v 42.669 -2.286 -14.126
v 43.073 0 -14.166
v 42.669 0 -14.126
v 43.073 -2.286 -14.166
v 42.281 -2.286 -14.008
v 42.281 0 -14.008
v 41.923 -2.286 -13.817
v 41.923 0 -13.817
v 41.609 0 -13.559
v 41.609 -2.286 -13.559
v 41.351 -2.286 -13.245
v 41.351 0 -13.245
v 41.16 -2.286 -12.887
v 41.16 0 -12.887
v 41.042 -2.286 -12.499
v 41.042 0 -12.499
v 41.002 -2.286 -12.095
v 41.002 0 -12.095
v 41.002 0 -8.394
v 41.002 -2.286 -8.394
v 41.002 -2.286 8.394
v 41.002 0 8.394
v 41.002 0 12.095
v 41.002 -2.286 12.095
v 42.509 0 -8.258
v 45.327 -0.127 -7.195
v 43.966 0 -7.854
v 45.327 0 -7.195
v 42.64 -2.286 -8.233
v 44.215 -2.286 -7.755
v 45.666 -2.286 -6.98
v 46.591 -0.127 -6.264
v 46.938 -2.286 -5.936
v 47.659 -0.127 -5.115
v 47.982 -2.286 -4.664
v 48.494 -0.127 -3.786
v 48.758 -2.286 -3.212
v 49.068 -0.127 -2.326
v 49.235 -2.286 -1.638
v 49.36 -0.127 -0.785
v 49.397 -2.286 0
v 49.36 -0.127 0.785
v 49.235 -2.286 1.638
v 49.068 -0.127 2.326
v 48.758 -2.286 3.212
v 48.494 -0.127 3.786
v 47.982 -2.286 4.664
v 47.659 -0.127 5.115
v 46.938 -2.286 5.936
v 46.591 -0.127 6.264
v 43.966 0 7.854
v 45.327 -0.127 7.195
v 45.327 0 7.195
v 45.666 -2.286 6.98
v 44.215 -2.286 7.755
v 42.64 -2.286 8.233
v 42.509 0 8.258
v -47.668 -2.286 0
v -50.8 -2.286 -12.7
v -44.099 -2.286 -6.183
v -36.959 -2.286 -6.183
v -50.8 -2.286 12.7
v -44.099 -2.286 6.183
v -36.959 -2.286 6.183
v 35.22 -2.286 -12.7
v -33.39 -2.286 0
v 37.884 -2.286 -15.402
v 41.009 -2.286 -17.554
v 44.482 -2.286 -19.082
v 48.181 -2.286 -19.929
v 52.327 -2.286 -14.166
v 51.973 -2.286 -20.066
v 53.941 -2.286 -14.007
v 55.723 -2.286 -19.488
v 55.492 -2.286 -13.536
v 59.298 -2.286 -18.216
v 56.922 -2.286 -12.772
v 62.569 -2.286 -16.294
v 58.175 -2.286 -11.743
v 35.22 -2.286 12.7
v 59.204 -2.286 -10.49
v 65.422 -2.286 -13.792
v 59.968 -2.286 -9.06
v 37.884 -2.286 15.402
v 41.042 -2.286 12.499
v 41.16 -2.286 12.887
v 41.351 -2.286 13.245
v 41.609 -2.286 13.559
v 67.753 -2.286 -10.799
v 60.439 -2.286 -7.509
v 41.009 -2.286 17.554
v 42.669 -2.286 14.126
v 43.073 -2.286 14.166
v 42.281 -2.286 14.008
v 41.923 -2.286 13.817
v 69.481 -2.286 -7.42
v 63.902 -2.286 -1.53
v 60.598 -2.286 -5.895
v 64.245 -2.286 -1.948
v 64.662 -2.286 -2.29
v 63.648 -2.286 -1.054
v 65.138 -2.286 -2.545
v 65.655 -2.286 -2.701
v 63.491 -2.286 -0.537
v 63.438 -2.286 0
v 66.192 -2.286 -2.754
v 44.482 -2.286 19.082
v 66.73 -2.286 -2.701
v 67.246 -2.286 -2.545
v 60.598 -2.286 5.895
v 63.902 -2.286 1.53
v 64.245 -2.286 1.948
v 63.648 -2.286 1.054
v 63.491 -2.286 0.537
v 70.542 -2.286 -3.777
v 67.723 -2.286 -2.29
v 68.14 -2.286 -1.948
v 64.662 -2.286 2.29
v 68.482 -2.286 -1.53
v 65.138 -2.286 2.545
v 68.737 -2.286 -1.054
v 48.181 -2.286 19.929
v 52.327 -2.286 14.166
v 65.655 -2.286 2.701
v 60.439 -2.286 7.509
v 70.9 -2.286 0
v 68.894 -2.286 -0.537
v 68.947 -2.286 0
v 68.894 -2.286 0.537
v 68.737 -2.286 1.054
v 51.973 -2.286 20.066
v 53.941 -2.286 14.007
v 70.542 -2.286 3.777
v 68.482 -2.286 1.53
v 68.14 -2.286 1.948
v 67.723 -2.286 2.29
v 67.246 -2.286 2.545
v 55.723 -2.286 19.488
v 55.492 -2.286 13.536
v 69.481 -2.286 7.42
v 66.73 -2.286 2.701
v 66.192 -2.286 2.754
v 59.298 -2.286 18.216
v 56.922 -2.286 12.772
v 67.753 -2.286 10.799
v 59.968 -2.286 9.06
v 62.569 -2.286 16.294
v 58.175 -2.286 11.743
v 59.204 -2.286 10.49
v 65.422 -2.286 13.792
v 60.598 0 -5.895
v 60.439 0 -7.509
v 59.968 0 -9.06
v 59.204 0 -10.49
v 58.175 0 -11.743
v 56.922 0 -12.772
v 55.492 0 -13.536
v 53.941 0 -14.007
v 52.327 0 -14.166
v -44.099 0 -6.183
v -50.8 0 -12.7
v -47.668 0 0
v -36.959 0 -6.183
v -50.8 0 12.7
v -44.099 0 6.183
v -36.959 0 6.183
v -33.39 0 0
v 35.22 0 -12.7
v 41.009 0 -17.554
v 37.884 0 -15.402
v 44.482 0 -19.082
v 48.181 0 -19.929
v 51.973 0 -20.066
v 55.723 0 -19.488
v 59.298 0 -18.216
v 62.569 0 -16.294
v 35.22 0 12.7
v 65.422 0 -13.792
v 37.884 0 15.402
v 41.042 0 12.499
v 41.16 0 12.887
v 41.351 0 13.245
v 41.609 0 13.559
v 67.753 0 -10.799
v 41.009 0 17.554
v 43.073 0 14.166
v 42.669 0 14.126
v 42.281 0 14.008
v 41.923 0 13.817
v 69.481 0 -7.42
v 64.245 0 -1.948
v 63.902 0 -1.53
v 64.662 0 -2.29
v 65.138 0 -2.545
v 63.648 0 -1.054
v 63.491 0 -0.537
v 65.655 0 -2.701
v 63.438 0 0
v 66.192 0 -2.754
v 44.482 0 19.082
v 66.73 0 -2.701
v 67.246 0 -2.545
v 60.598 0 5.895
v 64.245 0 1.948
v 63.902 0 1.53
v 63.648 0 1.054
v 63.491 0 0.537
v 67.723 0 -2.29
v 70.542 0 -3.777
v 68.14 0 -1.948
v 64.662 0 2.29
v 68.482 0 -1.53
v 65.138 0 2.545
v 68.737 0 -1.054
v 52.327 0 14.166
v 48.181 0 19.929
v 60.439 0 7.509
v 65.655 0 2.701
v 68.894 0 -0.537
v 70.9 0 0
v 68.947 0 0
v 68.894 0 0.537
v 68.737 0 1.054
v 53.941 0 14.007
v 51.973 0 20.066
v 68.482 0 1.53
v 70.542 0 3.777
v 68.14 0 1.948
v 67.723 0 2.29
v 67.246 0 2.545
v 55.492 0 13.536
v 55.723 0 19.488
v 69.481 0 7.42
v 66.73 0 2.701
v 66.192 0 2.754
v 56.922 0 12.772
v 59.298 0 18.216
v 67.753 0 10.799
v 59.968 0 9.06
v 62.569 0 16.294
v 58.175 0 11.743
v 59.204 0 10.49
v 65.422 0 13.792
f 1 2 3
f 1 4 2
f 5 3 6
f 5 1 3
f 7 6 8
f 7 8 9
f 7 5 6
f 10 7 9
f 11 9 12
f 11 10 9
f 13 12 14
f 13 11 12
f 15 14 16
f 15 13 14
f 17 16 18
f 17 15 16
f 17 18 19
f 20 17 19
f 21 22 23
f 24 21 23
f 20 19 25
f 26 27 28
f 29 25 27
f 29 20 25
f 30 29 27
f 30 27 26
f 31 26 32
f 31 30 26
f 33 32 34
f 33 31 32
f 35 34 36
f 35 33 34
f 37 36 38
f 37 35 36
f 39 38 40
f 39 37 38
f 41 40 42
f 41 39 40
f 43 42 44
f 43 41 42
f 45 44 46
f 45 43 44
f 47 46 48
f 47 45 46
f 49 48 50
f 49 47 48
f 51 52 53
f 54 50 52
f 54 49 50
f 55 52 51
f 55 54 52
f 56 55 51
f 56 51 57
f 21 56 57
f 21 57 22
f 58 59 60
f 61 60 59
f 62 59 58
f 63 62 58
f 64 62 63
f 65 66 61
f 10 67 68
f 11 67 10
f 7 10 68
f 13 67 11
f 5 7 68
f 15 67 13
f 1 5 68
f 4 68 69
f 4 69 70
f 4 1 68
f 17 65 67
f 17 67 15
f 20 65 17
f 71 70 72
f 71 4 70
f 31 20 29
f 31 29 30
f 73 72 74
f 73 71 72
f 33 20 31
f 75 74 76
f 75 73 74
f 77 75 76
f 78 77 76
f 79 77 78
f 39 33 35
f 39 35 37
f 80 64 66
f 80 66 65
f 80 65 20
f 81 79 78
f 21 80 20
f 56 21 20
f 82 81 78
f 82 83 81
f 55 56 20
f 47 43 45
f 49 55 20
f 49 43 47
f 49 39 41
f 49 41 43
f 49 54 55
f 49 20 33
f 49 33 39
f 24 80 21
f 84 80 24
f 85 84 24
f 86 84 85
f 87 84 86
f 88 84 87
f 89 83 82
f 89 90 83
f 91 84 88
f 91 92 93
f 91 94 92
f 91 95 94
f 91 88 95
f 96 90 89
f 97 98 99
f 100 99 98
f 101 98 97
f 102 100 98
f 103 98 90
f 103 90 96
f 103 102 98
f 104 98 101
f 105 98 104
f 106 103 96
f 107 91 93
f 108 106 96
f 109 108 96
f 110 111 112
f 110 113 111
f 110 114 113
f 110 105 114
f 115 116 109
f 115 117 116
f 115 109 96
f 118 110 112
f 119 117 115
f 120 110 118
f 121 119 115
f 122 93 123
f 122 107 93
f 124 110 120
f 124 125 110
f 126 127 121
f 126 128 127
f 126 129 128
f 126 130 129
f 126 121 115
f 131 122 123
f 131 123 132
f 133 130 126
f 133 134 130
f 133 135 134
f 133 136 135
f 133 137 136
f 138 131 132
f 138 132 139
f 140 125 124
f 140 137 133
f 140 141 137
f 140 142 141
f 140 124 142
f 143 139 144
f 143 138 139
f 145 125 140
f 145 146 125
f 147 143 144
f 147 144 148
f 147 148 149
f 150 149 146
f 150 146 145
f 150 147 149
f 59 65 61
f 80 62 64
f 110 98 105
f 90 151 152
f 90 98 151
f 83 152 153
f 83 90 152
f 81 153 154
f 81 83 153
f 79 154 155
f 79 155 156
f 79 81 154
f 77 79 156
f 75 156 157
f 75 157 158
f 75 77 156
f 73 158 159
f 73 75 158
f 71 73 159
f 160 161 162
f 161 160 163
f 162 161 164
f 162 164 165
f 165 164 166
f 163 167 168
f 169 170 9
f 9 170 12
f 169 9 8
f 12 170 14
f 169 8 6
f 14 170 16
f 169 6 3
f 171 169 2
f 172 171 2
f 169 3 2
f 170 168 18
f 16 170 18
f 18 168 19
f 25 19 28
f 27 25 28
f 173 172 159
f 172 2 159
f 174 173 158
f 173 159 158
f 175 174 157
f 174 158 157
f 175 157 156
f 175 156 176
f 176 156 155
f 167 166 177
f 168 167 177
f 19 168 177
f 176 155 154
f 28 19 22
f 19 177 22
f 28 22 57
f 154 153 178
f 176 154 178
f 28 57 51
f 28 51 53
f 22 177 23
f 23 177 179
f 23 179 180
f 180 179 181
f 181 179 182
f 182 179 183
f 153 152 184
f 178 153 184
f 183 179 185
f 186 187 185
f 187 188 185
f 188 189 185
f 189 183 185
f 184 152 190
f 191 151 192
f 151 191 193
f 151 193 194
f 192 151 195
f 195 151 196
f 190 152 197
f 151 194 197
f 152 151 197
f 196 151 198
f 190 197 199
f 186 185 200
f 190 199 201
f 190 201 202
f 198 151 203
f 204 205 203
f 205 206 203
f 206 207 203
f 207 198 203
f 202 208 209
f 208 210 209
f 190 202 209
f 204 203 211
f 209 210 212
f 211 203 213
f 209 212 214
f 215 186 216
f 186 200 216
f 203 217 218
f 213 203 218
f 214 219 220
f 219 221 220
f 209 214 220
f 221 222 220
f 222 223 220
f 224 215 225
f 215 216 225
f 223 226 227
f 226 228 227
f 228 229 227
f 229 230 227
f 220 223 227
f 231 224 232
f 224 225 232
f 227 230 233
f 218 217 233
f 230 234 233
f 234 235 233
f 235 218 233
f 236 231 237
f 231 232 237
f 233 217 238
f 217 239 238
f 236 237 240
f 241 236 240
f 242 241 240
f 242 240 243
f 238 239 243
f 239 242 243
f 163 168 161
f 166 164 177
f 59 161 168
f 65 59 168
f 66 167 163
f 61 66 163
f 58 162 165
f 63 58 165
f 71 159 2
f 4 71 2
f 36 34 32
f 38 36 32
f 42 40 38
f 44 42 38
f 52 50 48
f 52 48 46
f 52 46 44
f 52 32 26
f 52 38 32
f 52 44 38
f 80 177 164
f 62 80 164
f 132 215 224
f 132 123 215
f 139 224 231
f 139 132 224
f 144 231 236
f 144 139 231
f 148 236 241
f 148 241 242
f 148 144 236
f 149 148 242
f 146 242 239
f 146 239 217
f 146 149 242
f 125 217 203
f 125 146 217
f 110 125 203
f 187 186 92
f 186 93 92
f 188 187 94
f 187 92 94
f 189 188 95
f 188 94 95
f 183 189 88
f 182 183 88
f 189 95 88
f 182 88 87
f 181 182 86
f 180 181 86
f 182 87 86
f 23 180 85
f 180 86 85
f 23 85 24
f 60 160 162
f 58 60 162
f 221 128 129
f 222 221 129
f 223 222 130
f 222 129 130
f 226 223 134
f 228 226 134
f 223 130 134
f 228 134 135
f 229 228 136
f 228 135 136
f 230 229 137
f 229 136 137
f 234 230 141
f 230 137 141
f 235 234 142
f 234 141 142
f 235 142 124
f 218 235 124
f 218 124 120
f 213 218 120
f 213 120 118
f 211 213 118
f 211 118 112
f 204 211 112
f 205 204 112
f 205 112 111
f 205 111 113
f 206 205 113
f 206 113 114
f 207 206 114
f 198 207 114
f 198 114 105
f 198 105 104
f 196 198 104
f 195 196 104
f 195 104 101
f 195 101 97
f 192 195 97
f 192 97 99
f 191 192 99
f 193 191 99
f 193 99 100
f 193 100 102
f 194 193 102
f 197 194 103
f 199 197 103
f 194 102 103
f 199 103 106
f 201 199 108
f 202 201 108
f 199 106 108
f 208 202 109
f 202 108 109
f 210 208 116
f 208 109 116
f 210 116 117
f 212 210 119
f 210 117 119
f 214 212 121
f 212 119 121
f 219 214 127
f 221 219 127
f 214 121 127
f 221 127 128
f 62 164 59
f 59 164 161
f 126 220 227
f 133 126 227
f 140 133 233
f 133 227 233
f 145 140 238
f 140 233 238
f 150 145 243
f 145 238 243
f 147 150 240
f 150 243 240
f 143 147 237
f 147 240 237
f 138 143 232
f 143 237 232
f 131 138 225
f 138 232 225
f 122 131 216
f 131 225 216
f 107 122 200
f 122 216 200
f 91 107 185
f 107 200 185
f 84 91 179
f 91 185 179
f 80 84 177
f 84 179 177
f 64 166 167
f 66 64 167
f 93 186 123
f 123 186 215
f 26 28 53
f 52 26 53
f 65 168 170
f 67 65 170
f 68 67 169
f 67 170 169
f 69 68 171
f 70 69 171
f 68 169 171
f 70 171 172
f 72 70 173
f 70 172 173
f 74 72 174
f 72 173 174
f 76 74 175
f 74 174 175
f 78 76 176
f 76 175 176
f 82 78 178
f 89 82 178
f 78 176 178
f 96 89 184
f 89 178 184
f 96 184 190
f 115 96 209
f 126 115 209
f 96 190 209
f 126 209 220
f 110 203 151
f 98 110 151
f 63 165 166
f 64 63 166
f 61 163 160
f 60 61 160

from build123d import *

# Parameters (mm, degrees)
F2_DEPTH  = 2.286
F4_DEPTH  = 2.286
F5_R      = 2.0707192567
F7_R      = 8.2702748321
F8_R      = 2.754363365
F9_DEPTH  = 25.4
F11_DEPTH = 0.127
F13_DEPTH = 25.4


with BuildPart() as f2:
    # F0 (on Front) → F2 (new body)
    with BuildSketch(Plane.XZ):
        with BuildLine():
            Line((-50.8, -12.7), (35.2199618575, -12.7))
            ThreePointArc((35.2199618575, -12.7), (30.6995624794, 0), (35.2199618575, 12.7))
            Line((35.2199618575, 12.7), (-50.8, 12.7))
            Line((-50.8, 12.7), (-50.8, -12.7))
        make_face()
        with BuildLine():
            Line((41.0022673368, -14.1657050699), (41.0022673368, -12.7))
            Line((41.0022673368, -12.7), (35.2199618575, -12.7))
            ThreePointArc((35.2199618575, -12.7), (57.5402524162, -18.9366466379), (70.9004375206, 0))
            ThreePointArc((70.9004375206, 0), (57.5402524162, 18.9366466379), (35.2199618575, 12.7))
            Line((35.2199618575, 12.7), (41.0022673368, 12.7))
            Line((41.0022673368, 12.7), (41.0022673368, 14.1657050699))
            Line((41.0022673368, 14.1657050699), (60.5977326632, 14.1657050699))
            Line((60.5977326632, 14.1657050699), (60.5977326632, -14.1657050699))
            Line((60.5977326632, -14.1657050699), (41.0022673368, -14.1657050699))
        make_face()
        with BuildLine():
            Line((35.2199618575, -12.7), (41.0022673368, -12.7))
            Line((41.0022673368, -12.7), (41.0022673368, 12.7))
            Line((41.0022673368, 12.7), (35.2199618575, 12.7))
            ThreePointArc((35.2199618575, 12.7), (30.6995624794, 0), (35.2199618575, -12.7))
        make_face()
    extrude(amount=F2_DEPTH)

    # F3 (on face) → F4 (join)
    with BuildSketch(Plane.XZ.offset(2.286)):
        with BuildLine():
            Line((41.0022673368, 8.3944918588), (41.0022673368, -8.3944918588))
            ThreePointArc((41.0022673368, -8.3944918588), (49.3967591956, 0), (41.0022673368, 8.3944918588))
        make_face()
    extrude(amount=-F4_DEPTH)

    # F5
    f5_edges = [f2.edges().sort_by_distance(p)[0] for p in [
        (41.002267, -1.143, 14.165705),
        (41.002267, -1.143, -14.165705),
    ]]
    fillet(f5_edges, radius=F5_R)

    # F7
    f7_edges = [f2.edges().sort_by_distance(p)[0] for p in [
        (60.597733, -1.143, -14.165705),
        (60.597733, -1.143, 14.165705),
    ]]
    fillet(f7_edges, radius=F7_R)

    # F8 (on face) → F9 (cut)
    with BuildSketch(Plane.XZ.offset(2.286)):
        with Locations((66.192291677, 0)):
            Circle(F8_R)
    extrude(amount=-F9_DEPTH, mode=Mode.SUBTRACT)

    # F10 (on face) → F11 (cut)
    with BuildSketch(Plane(origin=(0, 0, 0), x_dir=(-1, 0, 0), z_dir=(0, 1, 0))):
        with BuildLine():
            ThreePointArc((-45.3273802996, 7.1945042516), (-49.3967591956, 0), (-45.3273802996, -7.1945042516))
            Line((-45.3273802996, -7.1945042516), (-45.3273802996, 7.1945042516))
        make_face()
    extrude(amount=-F11_DEPTH, mode=Mode.SUBTRACT)

    # F12 (on face) → F13 (cut)
    with BuildSketch(Plane(origin=(0, 0, 0), x_dir=(-1, 0, 0), z_dir=(0, 1, 0))):
        Polygon((44.0986434706, 6.1829173937), (36.9592254273, 6.1829173937), (33.3895164056, 0), (36.9592254273, -6.1829173937), (44.0986434706, -6.1829173937), (47.6683524923, 0), align=None)
    extrude(amount=-F13_DEPTH, mode=Mode.SUBTRACT)


solid = f2.part
